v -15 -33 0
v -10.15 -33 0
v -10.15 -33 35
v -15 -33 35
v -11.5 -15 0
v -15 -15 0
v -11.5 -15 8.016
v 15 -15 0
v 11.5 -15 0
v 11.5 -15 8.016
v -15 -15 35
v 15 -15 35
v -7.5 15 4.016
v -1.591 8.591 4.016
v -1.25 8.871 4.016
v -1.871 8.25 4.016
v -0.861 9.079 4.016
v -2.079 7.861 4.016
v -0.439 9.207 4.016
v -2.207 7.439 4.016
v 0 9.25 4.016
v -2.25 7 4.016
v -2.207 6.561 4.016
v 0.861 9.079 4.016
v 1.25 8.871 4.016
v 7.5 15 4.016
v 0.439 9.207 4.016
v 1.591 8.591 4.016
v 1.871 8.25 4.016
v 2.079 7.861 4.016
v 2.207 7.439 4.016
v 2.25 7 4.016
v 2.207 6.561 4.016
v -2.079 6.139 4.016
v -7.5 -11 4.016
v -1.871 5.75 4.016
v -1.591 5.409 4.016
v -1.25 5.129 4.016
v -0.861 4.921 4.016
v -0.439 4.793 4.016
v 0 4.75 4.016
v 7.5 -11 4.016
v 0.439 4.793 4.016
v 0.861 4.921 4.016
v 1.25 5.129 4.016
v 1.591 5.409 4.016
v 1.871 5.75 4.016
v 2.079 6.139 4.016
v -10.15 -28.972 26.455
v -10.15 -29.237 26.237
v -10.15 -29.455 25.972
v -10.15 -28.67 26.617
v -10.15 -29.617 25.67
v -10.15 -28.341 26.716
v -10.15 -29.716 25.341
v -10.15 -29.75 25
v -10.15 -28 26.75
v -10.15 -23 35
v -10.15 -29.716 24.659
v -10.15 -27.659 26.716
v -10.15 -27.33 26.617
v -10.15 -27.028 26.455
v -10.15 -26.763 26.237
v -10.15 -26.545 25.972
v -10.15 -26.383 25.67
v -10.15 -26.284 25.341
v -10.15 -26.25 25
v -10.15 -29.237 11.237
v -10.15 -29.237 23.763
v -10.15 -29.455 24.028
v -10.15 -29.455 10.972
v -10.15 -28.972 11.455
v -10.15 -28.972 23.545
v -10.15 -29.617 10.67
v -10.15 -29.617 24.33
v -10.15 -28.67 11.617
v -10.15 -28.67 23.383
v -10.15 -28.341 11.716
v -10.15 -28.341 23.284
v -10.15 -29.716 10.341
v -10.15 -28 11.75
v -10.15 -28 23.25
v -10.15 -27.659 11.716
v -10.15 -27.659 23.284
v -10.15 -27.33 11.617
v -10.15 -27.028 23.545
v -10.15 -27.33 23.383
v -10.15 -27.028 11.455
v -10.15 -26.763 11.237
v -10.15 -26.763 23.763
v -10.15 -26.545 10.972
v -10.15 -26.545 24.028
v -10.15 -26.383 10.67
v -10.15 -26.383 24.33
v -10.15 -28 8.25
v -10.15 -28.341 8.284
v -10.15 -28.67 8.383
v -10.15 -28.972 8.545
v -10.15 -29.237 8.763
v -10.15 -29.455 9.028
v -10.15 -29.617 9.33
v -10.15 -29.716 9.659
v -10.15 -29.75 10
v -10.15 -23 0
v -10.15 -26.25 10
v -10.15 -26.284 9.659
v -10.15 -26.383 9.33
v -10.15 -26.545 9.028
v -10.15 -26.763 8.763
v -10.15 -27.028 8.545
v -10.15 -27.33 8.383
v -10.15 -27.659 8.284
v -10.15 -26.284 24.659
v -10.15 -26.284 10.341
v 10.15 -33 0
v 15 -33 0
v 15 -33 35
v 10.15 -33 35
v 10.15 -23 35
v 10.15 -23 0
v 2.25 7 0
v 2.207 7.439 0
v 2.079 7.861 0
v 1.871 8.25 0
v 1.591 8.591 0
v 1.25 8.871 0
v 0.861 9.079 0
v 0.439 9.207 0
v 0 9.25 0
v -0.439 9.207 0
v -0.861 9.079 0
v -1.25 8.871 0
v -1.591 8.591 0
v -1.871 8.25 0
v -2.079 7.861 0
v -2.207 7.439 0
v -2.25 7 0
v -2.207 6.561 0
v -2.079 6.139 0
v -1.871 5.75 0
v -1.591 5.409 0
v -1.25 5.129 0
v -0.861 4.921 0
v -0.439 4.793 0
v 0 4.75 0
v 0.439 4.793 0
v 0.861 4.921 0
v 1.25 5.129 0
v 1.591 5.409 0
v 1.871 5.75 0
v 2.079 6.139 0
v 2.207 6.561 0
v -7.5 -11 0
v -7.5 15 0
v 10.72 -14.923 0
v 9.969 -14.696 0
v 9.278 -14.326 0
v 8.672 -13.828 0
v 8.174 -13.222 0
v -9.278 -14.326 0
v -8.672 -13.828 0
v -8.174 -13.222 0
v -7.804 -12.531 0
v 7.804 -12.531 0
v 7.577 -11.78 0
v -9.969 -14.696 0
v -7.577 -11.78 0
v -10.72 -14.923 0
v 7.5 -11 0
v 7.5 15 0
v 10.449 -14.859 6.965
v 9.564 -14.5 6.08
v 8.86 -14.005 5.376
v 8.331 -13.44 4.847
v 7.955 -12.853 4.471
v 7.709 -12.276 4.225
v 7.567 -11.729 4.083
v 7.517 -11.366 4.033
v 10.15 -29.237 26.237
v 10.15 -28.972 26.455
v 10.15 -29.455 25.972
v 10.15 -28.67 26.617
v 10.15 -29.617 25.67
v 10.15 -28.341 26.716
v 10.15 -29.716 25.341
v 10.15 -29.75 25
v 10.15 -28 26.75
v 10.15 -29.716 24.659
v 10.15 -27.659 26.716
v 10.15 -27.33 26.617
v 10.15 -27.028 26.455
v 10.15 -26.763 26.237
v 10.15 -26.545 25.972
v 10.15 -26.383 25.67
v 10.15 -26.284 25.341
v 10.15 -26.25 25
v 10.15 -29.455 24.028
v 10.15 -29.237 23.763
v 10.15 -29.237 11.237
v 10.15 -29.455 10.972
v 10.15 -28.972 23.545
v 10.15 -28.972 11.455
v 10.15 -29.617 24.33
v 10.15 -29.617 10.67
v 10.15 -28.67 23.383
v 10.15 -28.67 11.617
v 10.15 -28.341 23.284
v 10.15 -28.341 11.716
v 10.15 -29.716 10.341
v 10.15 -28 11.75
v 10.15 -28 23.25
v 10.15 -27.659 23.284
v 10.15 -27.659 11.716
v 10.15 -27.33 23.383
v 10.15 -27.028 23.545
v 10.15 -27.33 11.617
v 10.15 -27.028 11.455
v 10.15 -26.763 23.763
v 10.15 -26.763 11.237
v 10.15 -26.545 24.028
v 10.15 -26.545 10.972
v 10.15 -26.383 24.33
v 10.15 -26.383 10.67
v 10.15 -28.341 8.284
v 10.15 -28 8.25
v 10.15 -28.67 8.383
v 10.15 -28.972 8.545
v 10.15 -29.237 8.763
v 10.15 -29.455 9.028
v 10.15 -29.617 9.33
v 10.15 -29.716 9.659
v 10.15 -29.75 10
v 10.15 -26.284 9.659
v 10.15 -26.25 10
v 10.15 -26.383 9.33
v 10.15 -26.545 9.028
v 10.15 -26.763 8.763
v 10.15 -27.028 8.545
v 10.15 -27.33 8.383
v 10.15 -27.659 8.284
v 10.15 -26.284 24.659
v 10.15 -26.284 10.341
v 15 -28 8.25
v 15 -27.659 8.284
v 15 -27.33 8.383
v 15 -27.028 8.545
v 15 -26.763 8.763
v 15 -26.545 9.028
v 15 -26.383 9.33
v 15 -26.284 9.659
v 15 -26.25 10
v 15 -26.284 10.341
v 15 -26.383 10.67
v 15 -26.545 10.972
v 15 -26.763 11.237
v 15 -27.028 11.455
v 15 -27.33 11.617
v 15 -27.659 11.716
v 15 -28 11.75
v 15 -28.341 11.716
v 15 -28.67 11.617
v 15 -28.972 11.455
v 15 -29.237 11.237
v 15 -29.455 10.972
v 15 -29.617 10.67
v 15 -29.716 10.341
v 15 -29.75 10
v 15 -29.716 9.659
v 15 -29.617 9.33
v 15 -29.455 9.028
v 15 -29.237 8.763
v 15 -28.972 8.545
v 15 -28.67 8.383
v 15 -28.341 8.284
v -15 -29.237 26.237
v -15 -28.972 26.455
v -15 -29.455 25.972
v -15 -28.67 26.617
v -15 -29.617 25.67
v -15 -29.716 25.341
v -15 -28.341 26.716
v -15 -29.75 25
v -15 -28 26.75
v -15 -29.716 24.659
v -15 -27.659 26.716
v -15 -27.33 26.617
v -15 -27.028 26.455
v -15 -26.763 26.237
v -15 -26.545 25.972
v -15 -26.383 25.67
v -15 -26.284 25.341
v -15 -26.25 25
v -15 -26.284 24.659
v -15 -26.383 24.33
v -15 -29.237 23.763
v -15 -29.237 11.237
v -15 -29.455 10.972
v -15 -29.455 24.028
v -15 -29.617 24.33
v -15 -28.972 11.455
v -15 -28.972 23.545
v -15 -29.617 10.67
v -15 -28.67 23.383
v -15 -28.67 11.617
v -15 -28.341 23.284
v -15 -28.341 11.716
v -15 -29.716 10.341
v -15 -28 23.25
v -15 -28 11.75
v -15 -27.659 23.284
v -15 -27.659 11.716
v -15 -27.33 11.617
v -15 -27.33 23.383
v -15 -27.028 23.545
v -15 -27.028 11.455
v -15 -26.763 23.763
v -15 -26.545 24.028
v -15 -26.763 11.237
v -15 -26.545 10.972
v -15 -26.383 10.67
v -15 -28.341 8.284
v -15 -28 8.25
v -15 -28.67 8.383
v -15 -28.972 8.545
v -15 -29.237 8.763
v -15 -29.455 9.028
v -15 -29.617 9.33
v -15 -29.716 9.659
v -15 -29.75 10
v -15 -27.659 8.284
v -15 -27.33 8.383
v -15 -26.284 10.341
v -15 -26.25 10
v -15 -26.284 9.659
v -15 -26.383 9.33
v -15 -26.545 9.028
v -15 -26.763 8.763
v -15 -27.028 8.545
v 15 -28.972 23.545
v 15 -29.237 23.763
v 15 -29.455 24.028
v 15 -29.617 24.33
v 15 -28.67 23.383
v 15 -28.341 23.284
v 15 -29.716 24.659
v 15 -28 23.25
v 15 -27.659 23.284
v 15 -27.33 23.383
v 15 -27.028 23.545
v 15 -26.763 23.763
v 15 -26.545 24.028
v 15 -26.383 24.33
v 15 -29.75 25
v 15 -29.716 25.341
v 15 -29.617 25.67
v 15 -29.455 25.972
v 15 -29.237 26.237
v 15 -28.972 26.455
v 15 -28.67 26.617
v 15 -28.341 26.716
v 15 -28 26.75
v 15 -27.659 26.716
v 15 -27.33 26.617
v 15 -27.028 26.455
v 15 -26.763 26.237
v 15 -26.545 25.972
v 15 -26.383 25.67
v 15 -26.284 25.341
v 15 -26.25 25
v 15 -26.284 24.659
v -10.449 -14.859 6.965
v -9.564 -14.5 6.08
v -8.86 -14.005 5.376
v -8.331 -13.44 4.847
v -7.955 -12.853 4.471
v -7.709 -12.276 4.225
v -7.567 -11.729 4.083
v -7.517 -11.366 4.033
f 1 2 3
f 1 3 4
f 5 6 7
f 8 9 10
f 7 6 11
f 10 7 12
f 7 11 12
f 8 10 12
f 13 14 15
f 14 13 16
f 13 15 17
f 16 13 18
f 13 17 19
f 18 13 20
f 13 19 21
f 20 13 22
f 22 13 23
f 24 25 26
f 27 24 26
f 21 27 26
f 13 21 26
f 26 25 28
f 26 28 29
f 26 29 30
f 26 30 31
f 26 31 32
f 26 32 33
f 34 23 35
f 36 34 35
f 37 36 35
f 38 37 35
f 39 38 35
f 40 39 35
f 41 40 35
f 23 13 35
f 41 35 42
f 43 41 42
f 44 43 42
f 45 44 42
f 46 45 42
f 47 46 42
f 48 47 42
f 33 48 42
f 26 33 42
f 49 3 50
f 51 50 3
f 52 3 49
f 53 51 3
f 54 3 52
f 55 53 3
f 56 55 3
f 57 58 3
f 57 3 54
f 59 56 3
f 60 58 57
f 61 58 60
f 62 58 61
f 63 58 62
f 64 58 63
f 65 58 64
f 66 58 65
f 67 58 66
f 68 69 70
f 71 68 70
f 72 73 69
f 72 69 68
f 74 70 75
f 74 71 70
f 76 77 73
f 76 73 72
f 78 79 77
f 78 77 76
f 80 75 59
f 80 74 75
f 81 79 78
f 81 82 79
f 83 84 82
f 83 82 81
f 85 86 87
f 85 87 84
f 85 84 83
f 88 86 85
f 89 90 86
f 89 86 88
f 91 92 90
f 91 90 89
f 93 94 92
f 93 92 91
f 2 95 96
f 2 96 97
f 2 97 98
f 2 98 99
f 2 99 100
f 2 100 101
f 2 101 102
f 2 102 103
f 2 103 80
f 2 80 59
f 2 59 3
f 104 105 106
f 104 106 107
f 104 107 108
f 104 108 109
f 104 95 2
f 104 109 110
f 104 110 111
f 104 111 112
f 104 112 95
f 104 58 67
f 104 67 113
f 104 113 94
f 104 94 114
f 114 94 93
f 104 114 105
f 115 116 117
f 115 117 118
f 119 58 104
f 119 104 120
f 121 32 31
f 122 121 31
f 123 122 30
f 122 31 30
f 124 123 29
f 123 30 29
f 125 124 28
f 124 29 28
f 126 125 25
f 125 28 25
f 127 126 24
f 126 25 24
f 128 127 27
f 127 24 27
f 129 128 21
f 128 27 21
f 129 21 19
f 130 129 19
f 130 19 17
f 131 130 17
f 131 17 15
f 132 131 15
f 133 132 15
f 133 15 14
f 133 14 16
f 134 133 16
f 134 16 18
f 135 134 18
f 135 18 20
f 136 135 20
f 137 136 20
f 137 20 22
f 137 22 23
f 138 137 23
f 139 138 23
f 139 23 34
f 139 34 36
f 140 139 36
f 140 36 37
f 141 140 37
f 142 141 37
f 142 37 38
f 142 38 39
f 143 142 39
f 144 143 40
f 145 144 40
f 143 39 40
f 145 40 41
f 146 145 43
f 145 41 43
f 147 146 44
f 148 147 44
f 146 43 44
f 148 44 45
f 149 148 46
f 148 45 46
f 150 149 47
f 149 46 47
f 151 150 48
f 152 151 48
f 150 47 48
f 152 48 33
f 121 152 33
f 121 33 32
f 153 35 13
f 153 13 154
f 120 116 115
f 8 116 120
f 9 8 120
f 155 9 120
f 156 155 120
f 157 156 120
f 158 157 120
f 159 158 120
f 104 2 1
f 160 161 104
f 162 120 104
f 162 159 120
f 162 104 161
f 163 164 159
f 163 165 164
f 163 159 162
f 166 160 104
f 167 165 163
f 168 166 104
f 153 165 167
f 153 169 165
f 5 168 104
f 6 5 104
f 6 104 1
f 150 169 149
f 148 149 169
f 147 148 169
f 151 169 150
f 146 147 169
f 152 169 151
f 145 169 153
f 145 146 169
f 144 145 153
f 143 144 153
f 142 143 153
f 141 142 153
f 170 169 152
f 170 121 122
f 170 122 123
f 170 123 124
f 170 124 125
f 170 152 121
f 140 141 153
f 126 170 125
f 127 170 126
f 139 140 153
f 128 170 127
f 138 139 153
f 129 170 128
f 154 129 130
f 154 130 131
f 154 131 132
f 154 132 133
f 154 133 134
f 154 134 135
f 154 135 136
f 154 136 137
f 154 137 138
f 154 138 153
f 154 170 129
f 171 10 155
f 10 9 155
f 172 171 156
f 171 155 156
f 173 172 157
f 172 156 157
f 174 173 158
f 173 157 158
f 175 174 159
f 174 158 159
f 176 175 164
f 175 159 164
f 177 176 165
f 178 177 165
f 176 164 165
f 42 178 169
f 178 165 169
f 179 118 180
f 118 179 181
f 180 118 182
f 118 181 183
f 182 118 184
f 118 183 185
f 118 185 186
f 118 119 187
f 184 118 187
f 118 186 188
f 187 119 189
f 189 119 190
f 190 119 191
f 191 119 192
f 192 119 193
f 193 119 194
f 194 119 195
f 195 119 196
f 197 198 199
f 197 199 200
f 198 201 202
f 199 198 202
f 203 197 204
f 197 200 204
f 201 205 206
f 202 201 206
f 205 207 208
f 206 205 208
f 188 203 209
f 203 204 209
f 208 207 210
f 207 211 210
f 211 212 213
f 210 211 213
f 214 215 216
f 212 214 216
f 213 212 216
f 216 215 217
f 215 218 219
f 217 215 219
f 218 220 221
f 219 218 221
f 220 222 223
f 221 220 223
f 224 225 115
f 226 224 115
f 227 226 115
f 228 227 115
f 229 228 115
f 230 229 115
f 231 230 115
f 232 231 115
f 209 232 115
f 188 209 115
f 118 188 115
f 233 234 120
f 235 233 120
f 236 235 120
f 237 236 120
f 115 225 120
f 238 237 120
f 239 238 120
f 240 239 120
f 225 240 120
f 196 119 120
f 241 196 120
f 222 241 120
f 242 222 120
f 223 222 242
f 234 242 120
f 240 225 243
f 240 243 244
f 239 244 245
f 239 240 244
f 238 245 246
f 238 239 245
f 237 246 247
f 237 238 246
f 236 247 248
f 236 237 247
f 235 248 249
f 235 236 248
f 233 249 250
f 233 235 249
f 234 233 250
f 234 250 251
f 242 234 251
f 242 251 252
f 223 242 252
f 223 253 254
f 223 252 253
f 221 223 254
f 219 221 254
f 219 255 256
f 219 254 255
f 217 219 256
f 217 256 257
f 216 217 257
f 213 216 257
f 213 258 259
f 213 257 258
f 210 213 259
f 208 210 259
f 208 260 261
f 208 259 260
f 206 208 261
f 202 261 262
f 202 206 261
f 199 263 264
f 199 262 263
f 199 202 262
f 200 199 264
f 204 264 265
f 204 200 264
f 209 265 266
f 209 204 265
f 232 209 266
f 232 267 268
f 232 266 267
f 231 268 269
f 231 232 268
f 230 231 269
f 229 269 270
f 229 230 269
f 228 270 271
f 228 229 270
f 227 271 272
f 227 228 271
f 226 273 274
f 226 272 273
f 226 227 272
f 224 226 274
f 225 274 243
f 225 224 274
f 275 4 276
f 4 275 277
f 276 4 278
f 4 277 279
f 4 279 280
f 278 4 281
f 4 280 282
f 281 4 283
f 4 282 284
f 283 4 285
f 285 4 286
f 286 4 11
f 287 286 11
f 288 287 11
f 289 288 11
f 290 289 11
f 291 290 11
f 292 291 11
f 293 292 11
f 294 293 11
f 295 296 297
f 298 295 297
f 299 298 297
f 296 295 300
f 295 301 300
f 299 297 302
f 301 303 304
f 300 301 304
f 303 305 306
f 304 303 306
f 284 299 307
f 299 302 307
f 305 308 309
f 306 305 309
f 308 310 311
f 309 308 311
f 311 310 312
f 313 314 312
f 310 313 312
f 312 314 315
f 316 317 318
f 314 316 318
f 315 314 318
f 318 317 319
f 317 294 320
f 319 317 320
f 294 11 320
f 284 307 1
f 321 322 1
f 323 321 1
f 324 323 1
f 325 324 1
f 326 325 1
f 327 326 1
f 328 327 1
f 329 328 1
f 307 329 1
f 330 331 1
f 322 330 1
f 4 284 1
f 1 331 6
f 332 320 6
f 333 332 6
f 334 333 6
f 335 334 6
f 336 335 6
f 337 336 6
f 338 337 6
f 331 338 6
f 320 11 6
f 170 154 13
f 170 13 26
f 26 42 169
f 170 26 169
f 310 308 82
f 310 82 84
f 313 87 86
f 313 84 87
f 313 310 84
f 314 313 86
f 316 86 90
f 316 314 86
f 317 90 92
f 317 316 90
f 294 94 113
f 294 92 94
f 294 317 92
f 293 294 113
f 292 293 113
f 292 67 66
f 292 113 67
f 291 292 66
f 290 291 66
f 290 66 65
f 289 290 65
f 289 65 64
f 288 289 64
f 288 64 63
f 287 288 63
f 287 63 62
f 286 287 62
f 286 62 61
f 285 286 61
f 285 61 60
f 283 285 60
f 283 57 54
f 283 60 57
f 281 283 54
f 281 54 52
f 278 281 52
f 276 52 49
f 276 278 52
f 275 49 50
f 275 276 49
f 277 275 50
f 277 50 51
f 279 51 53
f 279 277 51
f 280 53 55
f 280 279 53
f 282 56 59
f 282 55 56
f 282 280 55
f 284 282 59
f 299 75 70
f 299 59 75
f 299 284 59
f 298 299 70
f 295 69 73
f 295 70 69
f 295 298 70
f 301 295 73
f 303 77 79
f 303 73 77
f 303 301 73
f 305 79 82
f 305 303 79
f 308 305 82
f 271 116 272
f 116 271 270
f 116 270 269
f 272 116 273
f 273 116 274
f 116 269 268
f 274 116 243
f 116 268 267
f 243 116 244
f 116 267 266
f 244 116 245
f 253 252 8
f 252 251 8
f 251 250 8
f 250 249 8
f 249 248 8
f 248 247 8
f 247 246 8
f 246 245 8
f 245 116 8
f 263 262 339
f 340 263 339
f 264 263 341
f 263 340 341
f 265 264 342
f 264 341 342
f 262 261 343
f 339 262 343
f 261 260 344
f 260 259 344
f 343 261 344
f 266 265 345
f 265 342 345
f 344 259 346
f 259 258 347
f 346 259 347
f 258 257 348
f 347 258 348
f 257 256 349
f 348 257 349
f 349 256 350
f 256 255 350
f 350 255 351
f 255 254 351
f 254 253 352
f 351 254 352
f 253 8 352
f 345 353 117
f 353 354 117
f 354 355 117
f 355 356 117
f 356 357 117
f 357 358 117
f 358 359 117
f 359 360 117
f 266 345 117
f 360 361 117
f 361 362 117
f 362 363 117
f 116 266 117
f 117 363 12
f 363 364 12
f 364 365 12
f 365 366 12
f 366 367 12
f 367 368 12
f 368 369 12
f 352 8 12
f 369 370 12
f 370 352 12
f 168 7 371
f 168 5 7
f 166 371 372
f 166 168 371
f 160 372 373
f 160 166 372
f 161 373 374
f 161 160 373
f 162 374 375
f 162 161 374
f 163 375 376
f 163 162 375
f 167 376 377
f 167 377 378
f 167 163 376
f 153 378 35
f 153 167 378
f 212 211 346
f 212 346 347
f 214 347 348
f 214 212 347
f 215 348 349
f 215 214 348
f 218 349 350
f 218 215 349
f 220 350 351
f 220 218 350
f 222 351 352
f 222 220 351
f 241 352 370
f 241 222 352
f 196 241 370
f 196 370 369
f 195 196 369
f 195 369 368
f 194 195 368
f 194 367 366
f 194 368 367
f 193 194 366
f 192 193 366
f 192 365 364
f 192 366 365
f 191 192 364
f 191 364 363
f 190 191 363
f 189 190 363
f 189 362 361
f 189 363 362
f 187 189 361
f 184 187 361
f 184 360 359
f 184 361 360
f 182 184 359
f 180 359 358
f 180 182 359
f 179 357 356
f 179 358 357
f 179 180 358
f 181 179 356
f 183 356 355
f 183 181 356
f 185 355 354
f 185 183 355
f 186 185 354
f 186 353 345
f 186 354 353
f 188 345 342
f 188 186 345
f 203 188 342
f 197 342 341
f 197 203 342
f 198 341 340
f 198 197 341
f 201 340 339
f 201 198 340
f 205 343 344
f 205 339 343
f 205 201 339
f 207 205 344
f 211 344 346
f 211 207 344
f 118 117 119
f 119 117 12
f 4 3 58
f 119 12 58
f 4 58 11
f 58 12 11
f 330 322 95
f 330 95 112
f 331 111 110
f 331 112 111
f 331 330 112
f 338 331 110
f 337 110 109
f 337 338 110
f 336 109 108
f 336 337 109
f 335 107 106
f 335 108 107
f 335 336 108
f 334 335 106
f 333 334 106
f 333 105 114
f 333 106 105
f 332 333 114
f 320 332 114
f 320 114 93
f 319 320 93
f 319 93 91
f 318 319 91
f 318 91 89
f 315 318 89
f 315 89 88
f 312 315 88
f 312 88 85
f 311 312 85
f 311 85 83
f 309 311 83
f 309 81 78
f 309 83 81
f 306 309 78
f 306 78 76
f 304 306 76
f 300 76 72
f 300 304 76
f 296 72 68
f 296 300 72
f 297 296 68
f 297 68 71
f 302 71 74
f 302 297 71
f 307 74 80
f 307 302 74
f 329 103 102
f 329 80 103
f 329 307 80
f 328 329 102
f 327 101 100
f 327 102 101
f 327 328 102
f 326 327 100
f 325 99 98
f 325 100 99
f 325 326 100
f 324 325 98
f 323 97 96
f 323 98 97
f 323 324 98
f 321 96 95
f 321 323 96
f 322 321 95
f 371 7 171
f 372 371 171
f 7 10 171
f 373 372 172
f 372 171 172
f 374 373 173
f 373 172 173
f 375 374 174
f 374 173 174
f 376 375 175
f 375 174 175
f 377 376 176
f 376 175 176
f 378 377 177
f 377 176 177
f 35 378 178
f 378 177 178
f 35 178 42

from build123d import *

# Parameters (mm, degrees)
CROQUIS1_W                 = 30
CROQUIS1_H                 = 30
SALIENTE_EXTRUIR1_DEPTH    = 7
CROQUIS2_W                 = 30
CROQUIS2_H                 = 35
SALIENTE_EXTRUIR2_DEPTH    = 8
CROQUIS3_W                 = 4.85
CROQUIS3_H                 = 35
SALIENTE_EXTRUIR3_DEPTH    = 10
CORTAR_EXTRUIR1_REACH      = 47.804
CROQUIS4_R                 = 2.25
CORTAR_EXTRUIR4_REACH      = 47.804
CROQUIS7_W                 = 30
CROQUIS7_H                 = 30
CROQUIS8_W                 = 15
CROQUIS8_H                 = 4.016004192
SALIENTE_EXTRUIR4_DEPTH    = 30
CORTAR_EXTRUIR5_REACH      = 49.687
CROQUIS9_R                 = 2.25
REDONDEO3_R                = 4
CORTAR_EXTRUIR6_DEPTH      = 55.281880034
CORTAR_EXTRUIR6_DEPTH_BACK = 55.281880034
CROQUIS10_R                = 1.75


with BuildPart() as part:
    # Croquis1 → Saliente-Extruir1 (new body)
    with BuildSketch(Plane.XY):
        Rectangle(CROQUIS1_W, CROQUIS1_H)
    extrude(amount=SALIENTE_EXTRUIR1_DEPTH)

    # Croquis2 → Saliente-Extruir2 (add)
    with BuildSketch(Plane.XZ.offset(15)):
        with Locations((0, 17.5)):
            Rectangle(CROQUIS2_W, CROQUIS2_H)
    extrude(amount=SALIENTE_EXTRUIR2_DEPTH)

    # Croquis3 → Saliente-Extruir3 (add)
    with BuildSketch(Plane(origin=(0, -23, 0), x_dir=(-1, 0, 0), z_dir=(0, -1, 0))):
        with Locations((12.575, -17.5)):
            Rectangle(CROQUIS3_W, CROQUIS3_H)
        with Locations((-12.575, -17.5)):
            Rectangle(CROQUIS3_W, CROQUIS3_H)
    extrude(amount=SALIENTE_EXTRUIR3_DEPTH)

    # Croquis4 → Cortar-Extruir1 (cut, up to next)
    with BuildSketch(Plane.XY.offset(7), mode=Mode.PRIVATE) as cortar_extruir1_sk1:
        with Locations((0, 7)):
            Circle(CROQUIS4_R)
    cortar_extruir1_tool1 = extrude(cortar_extruir1_sk1.sketch, amount=-CORTAR_EXTRUIR1_REACH, mode=Mode.PRIVATE) & part.part
    add(cortar_extruir1_tool1.solids().sort_by_distance((0, 7, 7))[0], mode=Mode.SUBTRACT)

    # Croquis7 → Cortar-Extruir4 (cut, up to next)
    with BuildSketch(Plane.XY.offset(7), mode=Mode.PRIVATE) as cortar_extruir4_sk1:
        Rectangle(CROQUIS7_W, CROQUIS7_H)
    cortar_extruir4_tool1 = extrude(cortar_extruir4_sk1.sketch, amount=-CORTAR_EXTRUIR4_REACH, mode=Mode.PRIVATE) & part.part
    add(cortar_extruir4_tool1.solids().sort_by_distance((0, 0, 7))[0], mode=Mode.SUBTRACT)

    # Croquis8 → Saliente-Extruir4 (add)
    with BuildSketch(Plane(origin=(0, -15, 0), x_dir=(1, 0, 0), z_dir=(0, 1, 0))):
        with Locations((0, -2.008002096)):
            Rectangle(CROQUIS8_W, CROQUIS8_H)
    extrude(amount=SALIENTE_EXTRUIR4_DEPTH)

    # Croquis9 → Cortar-Extruir5 (cut, up to next)
    with BuildSketch(Plane.XY.offset(4.016004192), mode=Mode.PRIVATE) as cortar_extruir5_sk1:
        with Locations((0, 7)):
            Circle(CROQUIS9_R)
    cortar_extruir5_tool1 = extrude(cortar_extruir5_sk1.sketch, amount=-CORTAR_EXTRUIR5_REACH, mode=Mode.PRIVATE) & part.part
    add(cortar_extruir5_tool1.solids().sort_by_distance((0, 7, 4.016004))[0], mode=Mode.SUBTRACT)

    # Redondeo3
    redondeo3_edges = [part.edges().sort_by_distance(p)[0] for p in [
        (7.5, -15, 2.008002096),
        (-7.5, -15, 2.008002096),
        (0, -15, 4.016004192),
    ]]
    fillet(redondeo3_edges, radius=REDONDEO3_R)

    # Croquis10 → Cortar-Extruir6 (cut, two sides: drawn at the far end of the back side and taken through both)
    with BuildSketch(Plane(origin=(-10.15, 0, 0), x_dir=(0, 0, -1), z_dir=(1, 0, 0)).offset(-CORTAR_EXTRUIR6_DEPTH_BACK)):
        with Locations((-10, -28)):
            Circle(CROQUIS10_R)
        with Locations((-25, -28)):
            Circle(CROQUIS10_R)
    extrude(amount=CORTAR_EXTRUIR6_DEPTH + CORTAR_EXTRUIR6_DEPTH_BACK, mode=Mode.SUBTRACT)


solid = part.part
